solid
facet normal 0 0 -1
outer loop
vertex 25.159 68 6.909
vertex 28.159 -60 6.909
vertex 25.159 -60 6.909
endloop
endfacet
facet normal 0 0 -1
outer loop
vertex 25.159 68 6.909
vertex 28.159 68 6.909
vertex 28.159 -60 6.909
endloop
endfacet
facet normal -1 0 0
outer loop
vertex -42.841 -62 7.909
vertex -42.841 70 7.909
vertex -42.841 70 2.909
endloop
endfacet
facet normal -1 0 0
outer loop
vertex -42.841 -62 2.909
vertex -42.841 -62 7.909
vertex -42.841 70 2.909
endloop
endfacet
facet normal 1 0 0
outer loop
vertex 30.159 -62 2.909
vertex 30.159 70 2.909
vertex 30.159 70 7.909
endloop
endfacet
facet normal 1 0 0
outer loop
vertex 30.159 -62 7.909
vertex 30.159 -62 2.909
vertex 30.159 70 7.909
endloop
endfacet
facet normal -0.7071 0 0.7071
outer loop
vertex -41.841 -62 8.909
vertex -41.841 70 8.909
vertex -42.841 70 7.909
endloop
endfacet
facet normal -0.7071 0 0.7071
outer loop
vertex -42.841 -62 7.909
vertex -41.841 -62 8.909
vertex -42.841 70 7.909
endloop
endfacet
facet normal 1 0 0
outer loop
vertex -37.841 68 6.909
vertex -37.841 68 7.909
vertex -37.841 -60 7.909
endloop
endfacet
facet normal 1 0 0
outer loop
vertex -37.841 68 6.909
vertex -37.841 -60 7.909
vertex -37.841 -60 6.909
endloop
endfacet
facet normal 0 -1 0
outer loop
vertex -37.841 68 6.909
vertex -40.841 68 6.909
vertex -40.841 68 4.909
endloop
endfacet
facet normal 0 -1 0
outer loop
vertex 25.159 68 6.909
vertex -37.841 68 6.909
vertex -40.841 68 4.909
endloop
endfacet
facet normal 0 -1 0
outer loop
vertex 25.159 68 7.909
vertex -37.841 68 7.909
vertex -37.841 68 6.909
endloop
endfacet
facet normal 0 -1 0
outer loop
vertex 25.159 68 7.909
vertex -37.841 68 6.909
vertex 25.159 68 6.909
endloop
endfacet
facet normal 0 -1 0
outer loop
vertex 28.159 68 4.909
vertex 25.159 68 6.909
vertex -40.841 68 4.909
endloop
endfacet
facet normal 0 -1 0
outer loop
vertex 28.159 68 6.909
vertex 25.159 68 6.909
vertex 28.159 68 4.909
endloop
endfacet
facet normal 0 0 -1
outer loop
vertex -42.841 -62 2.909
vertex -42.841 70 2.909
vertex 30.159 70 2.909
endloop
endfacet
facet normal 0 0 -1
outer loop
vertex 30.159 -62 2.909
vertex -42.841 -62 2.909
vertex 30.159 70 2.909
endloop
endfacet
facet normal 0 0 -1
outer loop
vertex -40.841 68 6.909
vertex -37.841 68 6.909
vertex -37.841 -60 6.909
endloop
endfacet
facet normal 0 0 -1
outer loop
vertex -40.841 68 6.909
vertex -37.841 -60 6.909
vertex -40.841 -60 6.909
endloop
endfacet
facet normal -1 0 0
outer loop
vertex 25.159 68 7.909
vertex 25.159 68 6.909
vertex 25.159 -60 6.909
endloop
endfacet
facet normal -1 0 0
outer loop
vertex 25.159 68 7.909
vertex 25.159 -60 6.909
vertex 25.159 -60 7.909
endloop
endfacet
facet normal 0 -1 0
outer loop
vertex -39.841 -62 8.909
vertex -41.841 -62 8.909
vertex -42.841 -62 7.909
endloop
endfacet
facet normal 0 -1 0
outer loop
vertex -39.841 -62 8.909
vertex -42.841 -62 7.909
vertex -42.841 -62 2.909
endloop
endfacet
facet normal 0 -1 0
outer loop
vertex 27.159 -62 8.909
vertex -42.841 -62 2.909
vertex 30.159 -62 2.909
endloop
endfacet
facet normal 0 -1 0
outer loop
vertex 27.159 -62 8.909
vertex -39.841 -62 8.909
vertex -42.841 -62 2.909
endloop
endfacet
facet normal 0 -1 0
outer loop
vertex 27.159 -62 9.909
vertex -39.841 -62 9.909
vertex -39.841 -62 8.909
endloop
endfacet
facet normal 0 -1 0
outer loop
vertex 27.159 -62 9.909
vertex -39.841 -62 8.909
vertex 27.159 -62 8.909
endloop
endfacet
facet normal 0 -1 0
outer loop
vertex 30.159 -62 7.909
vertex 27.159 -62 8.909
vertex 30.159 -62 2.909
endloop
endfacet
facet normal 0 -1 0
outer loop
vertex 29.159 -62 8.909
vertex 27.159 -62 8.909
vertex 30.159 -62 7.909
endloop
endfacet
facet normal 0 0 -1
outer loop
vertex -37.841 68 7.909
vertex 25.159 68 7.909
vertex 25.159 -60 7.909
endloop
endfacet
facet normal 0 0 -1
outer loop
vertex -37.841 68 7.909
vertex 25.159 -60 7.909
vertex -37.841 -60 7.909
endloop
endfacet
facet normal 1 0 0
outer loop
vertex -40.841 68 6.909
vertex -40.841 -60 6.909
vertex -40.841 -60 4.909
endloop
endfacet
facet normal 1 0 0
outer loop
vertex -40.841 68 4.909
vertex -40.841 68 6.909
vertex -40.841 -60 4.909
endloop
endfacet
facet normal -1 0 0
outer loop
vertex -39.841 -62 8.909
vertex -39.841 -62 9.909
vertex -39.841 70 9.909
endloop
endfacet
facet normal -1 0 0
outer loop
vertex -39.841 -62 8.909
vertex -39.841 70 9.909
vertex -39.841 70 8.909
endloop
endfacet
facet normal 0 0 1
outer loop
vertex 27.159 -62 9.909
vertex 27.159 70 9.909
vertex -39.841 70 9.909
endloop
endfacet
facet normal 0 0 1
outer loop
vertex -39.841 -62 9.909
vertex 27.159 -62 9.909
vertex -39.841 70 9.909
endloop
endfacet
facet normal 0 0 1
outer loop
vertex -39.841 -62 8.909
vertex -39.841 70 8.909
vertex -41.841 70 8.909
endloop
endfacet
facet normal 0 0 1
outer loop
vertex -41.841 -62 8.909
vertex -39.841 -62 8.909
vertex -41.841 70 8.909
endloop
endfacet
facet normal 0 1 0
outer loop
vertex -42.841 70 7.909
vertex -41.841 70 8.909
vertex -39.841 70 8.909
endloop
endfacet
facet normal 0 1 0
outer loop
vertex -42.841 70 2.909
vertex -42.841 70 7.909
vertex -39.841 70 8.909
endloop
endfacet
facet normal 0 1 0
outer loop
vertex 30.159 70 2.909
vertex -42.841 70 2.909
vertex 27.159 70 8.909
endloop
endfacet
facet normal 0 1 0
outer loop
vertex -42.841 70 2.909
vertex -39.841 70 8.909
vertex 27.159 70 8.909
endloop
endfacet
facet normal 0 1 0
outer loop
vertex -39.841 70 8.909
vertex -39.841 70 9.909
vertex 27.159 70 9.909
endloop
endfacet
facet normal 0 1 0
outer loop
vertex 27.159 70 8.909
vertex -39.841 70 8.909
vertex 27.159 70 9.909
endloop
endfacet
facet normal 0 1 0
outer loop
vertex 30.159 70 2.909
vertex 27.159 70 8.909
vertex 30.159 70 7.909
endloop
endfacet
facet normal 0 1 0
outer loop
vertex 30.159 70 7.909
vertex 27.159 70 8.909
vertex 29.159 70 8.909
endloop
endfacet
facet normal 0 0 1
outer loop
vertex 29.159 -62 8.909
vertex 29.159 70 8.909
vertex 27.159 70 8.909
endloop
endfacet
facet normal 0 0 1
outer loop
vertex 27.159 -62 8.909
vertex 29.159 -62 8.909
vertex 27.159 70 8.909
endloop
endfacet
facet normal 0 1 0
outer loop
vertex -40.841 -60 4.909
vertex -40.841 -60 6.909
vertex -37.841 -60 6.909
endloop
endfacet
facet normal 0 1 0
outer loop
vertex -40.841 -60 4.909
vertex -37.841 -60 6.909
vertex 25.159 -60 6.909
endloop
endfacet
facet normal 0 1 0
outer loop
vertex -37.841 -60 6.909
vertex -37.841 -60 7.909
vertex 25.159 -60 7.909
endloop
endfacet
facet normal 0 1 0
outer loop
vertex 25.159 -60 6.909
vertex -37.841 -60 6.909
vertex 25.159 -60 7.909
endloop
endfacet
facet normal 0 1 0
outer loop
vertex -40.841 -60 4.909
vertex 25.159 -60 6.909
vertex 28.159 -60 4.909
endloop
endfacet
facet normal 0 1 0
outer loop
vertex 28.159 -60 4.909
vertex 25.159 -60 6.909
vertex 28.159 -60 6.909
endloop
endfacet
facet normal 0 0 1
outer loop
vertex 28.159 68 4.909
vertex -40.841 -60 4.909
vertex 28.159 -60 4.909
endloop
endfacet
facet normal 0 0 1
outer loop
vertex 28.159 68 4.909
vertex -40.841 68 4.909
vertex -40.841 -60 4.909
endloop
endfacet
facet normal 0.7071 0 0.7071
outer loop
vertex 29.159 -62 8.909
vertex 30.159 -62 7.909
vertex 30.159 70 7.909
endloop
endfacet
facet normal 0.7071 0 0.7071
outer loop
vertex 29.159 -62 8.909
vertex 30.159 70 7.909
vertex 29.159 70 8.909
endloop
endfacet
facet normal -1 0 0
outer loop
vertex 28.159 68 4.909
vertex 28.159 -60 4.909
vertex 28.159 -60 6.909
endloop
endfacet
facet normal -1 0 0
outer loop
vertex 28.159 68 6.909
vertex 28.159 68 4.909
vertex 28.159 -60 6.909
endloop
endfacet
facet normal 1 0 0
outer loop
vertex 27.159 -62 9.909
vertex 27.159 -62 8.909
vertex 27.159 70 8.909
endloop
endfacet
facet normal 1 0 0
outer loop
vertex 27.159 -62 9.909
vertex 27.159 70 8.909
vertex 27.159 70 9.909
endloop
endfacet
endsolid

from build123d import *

# Parameters (mm, degrees)
F1_DEPTH = 132
F4_T     = -2


with BuildPart() as f1:
    # F0 (on Front) → F1 (new body)
    with BuildSketch(Plane.XZ):
        Polygon((-39.8409090909, -5.0908953616), (27.1590909091, -5.0908953616), (30.1590909091, -5.0908953616), (30.1590909091, -0.0908953616), (29.1590909091, 0.9091046384), (27.1590909091, 0.9091046384), (27.1590909091, 1.9091046384), (-39.8410601137, 1.909104627), (-39.8409090909, 0.9091046384), (-41.8409090909, 0.9088025928), (-42.8409090909, -0.0908953616), (-42.8409090909, -5.0908953616), align=None)
    extrude(amount=F1_DEPTH)


with BuildPart() as f1_1:
    # F2: moved
    add(f1.part.moved(Location((0, 0, 8))))


with BuildPart() as f1_2:
    # F3: moved
    add(f1_1.part.moved(Location((0, 70, 0))))

    # F4 (hollow: no face is removed)
    offset(amount=F4_T, kind=Kind.INTERSECTION, mode=Mode.SUBTRACT)


solid = f1_2.part
